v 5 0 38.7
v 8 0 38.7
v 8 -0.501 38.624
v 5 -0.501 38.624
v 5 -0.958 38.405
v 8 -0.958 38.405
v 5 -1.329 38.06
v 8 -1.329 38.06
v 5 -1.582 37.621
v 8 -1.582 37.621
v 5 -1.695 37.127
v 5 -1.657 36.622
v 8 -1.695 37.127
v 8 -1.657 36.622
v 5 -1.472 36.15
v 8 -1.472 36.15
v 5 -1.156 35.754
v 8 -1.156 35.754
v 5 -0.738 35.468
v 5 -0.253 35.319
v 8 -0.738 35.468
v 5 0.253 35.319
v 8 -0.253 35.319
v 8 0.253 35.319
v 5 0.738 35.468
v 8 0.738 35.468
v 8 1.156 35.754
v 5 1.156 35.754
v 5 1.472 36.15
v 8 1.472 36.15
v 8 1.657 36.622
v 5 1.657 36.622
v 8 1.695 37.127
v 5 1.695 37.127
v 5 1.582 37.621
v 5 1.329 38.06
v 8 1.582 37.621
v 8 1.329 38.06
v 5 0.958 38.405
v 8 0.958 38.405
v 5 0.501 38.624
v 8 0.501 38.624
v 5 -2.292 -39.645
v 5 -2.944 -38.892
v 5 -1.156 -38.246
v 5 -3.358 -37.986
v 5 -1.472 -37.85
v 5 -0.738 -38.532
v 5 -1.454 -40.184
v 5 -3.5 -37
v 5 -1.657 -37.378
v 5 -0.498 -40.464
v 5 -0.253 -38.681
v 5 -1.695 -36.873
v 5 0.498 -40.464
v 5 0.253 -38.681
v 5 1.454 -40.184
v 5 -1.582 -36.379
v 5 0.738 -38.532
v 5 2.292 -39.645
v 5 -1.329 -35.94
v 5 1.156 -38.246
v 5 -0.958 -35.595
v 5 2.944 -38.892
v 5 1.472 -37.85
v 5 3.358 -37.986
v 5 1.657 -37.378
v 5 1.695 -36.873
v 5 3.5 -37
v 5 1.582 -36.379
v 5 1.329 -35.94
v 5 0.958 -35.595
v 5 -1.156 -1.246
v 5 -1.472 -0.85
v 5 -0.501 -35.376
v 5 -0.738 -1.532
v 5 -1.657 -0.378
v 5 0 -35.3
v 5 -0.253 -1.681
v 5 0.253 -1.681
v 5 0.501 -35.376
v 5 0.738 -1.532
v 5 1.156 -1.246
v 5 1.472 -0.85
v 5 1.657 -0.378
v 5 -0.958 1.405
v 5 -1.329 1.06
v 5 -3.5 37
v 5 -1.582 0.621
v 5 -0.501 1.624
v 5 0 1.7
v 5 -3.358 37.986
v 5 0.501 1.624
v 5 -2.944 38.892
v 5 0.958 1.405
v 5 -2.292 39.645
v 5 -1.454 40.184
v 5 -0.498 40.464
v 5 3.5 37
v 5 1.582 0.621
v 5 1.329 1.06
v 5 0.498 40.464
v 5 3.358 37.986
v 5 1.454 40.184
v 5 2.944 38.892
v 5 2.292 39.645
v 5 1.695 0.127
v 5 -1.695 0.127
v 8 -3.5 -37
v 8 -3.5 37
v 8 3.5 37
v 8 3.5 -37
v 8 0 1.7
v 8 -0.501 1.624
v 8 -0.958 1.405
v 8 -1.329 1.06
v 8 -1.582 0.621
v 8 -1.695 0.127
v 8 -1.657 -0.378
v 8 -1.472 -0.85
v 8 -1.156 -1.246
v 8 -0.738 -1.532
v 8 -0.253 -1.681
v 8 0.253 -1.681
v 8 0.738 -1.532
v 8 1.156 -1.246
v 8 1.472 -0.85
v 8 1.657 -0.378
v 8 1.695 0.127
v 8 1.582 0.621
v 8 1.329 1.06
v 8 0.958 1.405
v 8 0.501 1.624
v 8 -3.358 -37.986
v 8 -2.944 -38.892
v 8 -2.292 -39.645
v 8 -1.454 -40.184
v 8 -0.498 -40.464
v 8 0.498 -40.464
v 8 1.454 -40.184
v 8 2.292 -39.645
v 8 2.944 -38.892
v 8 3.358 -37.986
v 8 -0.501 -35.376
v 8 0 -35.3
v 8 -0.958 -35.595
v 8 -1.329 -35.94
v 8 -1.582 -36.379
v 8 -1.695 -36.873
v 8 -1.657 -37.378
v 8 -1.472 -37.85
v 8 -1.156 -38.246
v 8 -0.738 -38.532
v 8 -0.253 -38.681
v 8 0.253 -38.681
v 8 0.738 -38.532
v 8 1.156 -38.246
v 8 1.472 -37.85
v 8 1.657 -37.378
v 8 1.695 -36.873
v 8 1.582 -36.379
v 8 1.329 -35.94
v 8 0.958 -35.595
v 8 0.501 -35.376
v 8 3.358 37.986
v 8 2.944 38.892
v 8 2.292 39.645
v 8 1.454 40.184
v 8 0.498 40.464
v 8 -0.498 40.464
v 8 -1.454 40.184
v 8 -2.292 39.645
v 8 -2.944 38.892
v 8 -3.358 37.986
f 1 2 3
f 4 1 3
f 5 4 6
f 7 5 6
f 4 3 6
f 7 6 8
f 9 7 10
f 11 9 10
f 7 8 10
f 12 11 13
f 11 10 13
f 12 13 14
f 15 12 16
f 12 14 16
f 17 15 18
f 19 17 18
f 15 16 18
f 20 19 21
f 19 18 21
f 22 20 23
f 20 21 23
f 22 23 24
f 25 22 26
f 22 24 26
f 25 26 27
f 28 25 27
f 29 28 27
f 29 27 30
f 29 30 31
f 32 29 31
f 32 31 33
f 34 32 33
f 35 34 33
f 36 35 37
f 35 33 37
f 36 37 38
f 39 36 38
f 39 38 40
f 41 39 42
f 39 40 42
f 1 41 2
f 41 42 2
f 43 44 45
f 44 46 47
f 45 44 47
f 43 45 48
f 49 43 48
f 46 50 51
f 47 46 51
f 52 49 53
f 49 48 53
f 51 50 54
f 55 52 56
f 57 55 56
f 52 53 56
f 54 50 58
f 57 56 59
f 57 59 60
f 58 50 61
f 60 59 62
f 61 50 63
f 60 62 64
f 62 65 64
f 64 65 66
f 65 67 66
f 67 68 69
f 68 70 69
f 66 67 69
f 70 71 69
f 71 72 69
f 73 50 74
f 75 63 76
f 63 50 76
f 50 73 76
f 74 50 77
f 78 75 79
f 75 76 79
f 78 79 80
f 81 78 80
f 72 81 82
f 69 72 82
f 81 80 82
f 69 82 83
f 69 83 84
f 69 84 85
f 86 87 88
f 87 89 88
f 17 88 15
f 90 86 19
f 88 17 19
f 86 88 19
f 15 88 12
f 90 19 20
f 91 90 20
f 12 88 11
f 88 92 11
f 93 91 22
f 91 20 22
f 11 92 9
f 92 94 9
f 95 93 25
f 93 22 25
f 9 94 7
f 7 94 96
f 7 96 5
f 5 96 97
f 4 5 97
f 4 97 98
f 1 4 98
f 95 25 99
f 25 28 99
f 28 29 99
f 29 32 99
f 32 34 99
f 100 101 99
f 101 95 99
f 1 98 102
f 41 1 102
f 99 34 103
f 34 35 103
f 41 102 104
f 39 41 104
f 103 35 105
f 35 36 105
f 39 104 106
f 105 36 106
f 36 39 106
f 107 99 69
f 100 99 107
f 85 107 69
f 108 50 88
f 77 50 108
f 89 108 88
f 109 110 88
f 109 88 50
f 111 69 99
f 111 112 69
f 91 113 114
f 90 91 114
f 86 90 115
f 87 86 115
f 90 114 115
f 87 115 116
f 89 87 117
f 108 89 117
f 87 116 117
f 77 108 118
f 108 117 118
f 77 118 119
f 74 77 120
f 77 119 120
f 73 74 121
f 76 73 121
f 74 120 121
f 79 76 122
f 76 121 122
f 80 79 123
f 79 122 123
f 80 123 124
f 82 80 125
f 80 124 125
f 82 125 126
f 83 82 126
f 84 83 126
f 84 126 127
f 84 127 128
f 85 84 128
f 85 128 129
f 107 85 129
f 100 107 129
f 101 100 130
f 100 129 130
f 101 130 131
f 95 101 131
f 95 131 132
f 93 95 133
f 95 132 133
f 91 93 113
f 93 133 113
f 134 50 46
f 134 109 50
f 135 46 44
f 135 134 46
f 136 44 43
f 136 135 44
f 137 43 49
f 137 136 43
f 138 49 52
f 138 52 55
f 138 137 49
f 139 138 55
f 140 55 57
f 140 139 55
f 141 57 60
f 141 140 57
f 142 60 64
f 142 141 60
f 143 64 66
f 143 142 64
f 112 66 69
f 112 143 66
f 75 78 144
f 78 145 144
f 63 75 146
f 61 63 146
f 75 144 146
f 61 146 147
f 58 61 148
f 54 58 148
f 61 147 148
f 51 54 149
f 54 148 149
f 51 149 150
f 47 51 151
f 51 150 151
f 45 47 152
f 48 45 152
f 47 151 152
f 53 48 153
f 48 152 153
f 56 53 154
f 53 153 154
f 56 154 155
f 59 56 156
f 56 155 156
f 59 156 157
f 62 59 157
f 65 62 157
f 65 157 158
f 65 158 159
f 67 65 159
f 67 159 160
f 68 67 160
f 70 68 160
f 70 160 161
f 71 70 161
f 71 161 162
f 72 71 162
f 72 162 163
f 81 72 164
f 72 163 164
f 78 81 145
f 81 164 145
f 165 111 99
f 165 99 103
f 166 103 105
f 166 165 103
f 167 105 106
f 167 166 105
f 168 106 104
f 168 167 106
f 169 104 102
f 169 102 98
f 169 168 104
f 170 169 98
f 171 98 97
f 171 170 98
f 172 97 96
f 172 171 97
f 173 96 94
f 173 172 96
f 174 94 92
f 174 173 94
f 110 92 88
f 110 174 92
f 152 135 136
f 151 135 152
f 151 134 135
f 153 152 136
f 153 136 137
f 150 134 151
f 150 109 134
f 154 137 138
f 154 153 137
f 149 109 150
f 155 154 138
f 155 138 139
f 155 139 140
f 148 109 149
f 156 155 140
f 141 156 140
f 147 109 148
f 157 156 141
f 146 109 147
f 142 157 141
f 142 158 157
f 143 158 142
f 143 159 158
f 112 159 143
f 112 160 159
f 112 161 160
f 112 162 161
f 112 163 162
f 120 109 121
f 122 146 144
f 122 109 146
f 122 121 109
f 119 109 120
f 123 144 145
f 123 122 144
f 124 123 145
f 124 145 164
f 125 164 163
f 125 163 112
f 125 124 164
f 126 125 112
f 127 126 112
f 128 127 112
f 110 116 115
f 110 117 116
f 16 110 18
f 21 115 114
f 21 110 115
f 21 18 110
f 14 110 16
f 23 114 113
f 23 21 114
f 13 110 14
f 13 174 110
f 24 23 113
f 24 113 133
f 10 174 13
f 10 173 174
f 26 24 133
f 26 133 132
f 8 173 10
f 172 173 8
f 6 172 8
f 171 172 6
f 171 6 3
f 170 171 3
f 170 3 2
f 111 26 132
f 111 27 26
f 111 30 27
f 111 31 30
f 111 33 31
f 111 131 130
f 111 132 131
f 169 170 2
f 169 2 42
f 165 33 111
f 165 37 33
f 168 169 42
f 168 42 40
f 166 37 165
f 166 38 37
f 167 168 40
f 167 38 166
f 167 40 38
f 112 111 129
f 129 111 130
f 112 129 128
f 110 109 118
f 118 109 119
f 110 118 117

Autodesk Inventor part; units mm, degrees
ref_plane "YZ Plane" through (0, 0, 0) normal (1, 0, 0) x (0, 1, 0)
ref_plane "XZ Plane" through (0, 0, 0) normal (0, 1, 0) x (-1, 0, 0)
ref_plane "XY Plane" through (0, 0, 0) normal (0, 0, 1) x (1, 0, 0)
sketch "Sketch1" plane through (0, 0, 0) normal (1, 0, 0) x (0, 1, 0)
  line L0 (0, 37) -> (0, -37) construction
  line L1 (-3.5, 37) -> (-3.5, -37)
  line L2 (3.5, -37) -> (3.5, 37)
  arc A0 (3.5, 37) -> (-3.5, 37) centre (0, 37) ccw
  arc A1 (-3.5, -37) -> (3.5, -37) centre (0, -37) ccw
  circle A2 centre (0, -37) radius 1.5
  circle A3 centre (0, 0) radius 1.5
  circle A4 centre (0, 37) radius 1.5
  point P0 (0, 40.5)
  point P1 (0, -40.5)
  dimension "d14" = 7
  dimension "d15" = 81
  dimension "d16" = 3
extrude "Extrusión3" add sketch "Sketch1" along normal mid plane 16 contours A0 L2 A1 L1 | A2 | A3 | A4
extrude "Extrusión4" cut sketch "Sketch1" along normal mid plane 10 contours A0 L2 A1 L1 | A3
sketch "Boceto2" plane through (-8, 0, 0) normal (-1, 0, 0) x (0, 0, 1)
  circle A0 centre (37, 0) radius 1.5 projected
  circle A1 centre (-37, 0) radius 1.5 projected
  point P0 (0, 0)
  point P1 (0, 0)
hole "Agujero1" at (-8, 0, 37) at (-8, 0, -37) at (-8, 0, 0) direction (1, 0, 0) diameter 3.4 end through all clearance for "Tornillo de cabeza plana avellanada ISO 2009/7046" size "M3" standard "ISO"
split "Dividir1" plane through (0, 0, 0) removes the side toward (-1, 0, 0)
sketch "Boceto3" plane through (-5, 0, 0) normal (1, 0, 0) x (0, 0, -1)
  circle A0 centre (0, 0) radius 1.7 projected
  circle A1 centre (37, 0) radius 1.7 projected
  circle A2 centre (-37, 0) radius 1.7 projected
  arc A3 (37, -3.5) -> (37, 3.5) centre (37, 0) ccw projected
  line L0 (37, 3.5) -> (-37, 3.5) projected
  arc A4 (-37, 3.5) -> (-37, -3.5) centre (-37, 0) ccw projected
  line L1 (-37, -3.5) -> (37, -3.5) projected
extrude "Extrusión5" cut sketch "Boceto3" against normal blind 10 contours A0 | A1 | A2 | L1 A4 L0 A3
equation "\"d19\" = Dedos"
equation "\"Dedos\" = 10"
properties part number "Corredera I"
